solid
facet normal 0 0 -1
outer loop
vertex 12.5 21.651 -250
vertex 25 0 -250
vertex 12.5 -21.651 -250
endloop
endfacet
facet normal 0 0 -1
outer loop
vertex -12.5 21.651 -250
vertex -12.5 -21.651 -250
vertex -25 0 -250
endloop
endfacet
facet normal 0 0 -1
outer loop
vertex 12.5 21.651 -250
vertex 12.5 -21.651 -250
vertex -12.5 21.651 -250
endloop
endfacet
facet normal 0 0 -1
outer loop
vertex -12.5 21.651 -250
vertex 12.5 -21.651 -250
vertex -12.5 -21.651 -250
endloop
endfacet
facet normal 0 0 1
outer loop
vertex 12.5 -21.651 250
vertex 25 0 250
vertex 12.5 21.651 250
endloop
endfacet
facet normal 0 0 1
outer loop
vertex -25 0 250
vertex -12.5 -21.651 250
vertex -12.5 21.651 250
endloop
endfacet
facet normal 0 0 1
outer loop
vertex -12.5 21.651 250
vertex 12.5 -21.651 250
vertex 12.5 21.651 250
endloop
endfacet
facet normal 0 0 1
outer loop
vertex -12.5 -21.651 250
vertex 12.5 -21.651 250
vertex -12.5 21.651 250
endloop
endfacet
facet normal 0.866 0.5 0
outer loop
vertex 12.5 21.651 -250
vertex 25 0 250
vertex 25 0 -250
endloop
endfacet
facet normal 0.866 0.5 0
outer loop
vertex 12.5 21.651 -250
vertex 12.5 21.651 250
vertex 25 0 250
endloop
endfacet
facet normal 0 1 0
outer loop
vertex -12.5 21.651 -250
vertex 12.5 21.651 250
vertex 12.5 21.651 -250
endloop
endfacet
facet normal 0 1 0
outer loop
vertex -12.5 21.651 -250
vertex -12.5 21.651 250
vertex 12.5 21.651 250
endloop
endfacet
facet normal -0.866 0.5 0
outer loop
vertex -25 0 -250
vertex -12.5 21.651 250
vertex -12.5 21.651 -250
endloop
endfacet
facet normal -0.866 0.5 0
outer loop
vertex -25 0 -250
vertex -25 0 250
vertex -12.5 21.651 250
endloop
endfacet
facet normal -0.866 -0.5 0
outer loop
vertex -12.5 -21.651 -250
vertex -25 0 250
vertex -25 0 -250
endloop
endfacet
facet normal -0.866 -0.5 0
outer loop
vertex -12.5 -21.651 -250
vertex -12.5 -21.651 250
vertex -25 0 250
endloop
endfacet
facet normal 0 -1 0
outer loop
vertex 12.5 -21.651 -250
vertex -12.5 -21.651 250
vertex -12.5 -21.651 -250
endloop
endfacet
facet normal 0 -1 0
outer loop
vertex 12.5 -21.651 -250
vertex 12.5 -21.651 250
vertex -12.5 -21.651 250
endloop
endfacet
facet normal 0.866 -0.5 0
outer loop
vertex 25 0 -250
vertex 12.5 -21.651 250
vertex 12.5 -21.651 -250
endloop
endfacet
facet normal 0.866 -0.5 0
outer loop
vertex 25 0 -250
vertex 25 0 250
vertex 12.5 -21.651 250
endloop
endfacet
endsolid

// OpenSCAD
// include <../../config.scad>;

module beam_hexagonal(L, d, centre = true, suppress_shopping_outputs = false) {
    radius = d / 2;
    linear_extrude(L, center = centre) polygon([[radius, 0], [radius * cos(60), radius * sin(60)], [radius * cos(120), radius * sin(120)], [radius * cos(180), radius * sin(180)], [radius * cos(240), radius * sin(240)], [radius * cos(300), radius * sin(300)]]);
    // Shopping
    if (!suppress_shopping_outputs) {
        echo(str("Hexagonal beam: Hexagonal beam Φ", d, "mm x ", L, "mm - x1"));
    }
}

// $fn = 200;
beam_hexagonal(500, 50);
